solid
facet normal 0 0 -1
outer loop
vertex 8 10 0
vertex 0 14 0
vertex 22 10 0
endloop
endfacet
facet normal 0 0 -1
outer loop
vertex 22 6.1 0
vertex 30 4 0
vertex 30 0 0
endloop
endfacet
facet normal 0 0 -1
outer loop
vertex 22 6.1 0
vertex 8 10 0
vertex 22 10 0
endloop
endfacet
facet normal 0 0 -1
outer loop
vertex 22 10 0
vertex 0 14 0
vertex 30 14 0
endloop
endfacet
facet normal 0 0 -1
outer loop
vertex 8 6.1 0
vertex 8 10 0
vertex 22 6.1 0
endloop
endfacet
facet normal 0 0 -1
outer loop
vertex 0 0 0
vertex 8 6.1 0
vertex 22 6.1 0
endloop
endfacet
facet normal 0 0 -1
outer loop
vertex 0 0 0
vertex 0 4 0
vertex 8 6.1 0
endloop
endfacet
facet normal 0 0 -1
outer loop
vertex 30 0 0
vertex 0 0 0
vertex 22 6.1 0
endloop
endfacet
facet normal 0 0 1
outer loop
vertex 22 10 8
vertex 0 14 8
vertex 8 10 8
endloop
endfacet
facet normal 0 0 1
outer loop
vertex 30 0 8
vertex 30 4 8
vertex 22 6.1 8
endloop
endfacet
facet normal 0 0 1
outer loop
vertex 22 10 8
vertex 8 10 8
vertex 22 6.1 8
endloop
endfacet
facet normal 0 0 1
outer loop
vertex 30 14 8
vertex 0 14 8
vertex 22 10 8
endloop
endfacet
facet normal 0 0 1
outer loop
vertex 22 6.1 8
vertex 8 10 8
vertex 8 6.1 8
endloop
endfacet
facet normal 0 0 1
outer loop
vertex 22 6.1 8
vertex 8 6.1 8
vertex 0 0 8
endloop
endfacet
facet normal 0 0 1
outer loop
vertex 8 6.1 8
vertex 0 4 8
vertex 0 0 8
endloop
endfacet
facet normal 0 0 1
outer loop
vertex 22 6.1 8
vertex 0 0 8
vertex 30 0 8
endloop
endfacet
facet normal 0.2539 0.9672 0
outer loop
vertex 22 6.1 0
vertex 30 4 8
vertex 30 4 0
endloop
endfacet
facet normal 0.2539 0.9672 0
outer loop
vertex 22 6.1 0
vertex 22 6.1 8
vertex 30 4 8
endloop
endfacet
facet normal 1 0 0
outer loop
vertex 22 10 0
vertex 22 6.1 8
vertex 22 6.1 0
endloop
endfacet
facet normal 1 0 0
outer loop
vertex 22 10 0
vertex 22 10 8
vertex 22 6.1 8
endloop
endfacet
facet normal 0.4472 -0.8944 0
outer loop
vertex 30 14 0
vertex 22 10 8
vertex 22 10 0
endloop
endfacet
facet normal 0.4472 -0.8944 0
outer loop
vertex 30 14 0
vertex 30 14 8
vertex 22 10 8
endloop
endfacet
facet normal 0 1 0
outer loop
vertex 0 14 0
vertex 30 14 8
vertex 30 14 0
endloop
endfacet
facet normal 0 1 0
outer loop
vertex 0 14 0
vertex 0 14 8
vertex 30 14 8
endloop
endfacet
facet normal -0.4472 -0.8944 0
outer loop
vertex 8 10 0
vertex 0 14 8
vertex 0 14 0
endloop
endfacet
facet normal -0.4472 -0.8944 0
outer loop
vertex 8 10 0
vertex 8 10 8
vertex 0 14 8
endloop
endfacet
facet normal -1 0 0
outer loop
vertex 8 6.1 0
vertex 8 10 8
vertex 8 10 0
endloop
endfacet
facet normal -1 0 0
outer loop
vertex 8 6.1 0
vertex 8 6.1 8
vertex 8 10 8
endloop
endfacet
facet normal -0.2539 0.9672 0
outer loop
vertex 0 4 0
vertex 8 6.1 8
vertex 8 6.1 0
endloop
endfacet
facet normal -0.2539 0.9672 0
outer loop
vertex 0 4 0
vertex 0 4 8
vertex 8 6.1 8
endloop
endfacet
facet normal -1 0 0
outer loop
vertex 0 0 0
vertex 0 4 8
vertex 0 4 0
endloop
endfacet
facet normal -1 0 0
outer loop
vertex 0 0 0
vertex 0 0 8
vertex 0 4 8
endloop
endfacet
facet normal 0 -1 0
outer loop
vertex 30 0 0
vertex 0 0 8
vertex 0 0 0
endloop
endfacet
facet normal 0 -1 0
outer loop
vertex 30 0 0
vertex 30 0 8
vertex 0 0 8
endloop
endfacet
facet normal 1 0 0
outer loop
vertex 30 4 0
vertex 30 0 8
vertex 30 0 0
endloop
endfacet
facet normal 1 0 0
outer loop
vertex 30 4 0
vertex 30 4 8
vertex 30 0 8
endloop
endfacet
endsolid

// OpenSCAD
$fn = 32;

// ----------------------------------------------------------------------
// Key bar: dovetail key, 8 mm thick
// ----------------------------------------------------------------------

// --- parameters (mm) ---
profile_height = 8;       // extrusion height
profile_points = 10;      // points of the closed outline

profile = [[0, 0], [30, 0], [30, 4], [22, 6.1], [22, 10], [30, 14], [0, 14], [8, 10], [8, 6.1], [0, 4]];  // single closed polygon, 10 points, counter clockwise

// --- the one profile operation ---
linear_extrude(height = profile_height) polygon(points = profile);
